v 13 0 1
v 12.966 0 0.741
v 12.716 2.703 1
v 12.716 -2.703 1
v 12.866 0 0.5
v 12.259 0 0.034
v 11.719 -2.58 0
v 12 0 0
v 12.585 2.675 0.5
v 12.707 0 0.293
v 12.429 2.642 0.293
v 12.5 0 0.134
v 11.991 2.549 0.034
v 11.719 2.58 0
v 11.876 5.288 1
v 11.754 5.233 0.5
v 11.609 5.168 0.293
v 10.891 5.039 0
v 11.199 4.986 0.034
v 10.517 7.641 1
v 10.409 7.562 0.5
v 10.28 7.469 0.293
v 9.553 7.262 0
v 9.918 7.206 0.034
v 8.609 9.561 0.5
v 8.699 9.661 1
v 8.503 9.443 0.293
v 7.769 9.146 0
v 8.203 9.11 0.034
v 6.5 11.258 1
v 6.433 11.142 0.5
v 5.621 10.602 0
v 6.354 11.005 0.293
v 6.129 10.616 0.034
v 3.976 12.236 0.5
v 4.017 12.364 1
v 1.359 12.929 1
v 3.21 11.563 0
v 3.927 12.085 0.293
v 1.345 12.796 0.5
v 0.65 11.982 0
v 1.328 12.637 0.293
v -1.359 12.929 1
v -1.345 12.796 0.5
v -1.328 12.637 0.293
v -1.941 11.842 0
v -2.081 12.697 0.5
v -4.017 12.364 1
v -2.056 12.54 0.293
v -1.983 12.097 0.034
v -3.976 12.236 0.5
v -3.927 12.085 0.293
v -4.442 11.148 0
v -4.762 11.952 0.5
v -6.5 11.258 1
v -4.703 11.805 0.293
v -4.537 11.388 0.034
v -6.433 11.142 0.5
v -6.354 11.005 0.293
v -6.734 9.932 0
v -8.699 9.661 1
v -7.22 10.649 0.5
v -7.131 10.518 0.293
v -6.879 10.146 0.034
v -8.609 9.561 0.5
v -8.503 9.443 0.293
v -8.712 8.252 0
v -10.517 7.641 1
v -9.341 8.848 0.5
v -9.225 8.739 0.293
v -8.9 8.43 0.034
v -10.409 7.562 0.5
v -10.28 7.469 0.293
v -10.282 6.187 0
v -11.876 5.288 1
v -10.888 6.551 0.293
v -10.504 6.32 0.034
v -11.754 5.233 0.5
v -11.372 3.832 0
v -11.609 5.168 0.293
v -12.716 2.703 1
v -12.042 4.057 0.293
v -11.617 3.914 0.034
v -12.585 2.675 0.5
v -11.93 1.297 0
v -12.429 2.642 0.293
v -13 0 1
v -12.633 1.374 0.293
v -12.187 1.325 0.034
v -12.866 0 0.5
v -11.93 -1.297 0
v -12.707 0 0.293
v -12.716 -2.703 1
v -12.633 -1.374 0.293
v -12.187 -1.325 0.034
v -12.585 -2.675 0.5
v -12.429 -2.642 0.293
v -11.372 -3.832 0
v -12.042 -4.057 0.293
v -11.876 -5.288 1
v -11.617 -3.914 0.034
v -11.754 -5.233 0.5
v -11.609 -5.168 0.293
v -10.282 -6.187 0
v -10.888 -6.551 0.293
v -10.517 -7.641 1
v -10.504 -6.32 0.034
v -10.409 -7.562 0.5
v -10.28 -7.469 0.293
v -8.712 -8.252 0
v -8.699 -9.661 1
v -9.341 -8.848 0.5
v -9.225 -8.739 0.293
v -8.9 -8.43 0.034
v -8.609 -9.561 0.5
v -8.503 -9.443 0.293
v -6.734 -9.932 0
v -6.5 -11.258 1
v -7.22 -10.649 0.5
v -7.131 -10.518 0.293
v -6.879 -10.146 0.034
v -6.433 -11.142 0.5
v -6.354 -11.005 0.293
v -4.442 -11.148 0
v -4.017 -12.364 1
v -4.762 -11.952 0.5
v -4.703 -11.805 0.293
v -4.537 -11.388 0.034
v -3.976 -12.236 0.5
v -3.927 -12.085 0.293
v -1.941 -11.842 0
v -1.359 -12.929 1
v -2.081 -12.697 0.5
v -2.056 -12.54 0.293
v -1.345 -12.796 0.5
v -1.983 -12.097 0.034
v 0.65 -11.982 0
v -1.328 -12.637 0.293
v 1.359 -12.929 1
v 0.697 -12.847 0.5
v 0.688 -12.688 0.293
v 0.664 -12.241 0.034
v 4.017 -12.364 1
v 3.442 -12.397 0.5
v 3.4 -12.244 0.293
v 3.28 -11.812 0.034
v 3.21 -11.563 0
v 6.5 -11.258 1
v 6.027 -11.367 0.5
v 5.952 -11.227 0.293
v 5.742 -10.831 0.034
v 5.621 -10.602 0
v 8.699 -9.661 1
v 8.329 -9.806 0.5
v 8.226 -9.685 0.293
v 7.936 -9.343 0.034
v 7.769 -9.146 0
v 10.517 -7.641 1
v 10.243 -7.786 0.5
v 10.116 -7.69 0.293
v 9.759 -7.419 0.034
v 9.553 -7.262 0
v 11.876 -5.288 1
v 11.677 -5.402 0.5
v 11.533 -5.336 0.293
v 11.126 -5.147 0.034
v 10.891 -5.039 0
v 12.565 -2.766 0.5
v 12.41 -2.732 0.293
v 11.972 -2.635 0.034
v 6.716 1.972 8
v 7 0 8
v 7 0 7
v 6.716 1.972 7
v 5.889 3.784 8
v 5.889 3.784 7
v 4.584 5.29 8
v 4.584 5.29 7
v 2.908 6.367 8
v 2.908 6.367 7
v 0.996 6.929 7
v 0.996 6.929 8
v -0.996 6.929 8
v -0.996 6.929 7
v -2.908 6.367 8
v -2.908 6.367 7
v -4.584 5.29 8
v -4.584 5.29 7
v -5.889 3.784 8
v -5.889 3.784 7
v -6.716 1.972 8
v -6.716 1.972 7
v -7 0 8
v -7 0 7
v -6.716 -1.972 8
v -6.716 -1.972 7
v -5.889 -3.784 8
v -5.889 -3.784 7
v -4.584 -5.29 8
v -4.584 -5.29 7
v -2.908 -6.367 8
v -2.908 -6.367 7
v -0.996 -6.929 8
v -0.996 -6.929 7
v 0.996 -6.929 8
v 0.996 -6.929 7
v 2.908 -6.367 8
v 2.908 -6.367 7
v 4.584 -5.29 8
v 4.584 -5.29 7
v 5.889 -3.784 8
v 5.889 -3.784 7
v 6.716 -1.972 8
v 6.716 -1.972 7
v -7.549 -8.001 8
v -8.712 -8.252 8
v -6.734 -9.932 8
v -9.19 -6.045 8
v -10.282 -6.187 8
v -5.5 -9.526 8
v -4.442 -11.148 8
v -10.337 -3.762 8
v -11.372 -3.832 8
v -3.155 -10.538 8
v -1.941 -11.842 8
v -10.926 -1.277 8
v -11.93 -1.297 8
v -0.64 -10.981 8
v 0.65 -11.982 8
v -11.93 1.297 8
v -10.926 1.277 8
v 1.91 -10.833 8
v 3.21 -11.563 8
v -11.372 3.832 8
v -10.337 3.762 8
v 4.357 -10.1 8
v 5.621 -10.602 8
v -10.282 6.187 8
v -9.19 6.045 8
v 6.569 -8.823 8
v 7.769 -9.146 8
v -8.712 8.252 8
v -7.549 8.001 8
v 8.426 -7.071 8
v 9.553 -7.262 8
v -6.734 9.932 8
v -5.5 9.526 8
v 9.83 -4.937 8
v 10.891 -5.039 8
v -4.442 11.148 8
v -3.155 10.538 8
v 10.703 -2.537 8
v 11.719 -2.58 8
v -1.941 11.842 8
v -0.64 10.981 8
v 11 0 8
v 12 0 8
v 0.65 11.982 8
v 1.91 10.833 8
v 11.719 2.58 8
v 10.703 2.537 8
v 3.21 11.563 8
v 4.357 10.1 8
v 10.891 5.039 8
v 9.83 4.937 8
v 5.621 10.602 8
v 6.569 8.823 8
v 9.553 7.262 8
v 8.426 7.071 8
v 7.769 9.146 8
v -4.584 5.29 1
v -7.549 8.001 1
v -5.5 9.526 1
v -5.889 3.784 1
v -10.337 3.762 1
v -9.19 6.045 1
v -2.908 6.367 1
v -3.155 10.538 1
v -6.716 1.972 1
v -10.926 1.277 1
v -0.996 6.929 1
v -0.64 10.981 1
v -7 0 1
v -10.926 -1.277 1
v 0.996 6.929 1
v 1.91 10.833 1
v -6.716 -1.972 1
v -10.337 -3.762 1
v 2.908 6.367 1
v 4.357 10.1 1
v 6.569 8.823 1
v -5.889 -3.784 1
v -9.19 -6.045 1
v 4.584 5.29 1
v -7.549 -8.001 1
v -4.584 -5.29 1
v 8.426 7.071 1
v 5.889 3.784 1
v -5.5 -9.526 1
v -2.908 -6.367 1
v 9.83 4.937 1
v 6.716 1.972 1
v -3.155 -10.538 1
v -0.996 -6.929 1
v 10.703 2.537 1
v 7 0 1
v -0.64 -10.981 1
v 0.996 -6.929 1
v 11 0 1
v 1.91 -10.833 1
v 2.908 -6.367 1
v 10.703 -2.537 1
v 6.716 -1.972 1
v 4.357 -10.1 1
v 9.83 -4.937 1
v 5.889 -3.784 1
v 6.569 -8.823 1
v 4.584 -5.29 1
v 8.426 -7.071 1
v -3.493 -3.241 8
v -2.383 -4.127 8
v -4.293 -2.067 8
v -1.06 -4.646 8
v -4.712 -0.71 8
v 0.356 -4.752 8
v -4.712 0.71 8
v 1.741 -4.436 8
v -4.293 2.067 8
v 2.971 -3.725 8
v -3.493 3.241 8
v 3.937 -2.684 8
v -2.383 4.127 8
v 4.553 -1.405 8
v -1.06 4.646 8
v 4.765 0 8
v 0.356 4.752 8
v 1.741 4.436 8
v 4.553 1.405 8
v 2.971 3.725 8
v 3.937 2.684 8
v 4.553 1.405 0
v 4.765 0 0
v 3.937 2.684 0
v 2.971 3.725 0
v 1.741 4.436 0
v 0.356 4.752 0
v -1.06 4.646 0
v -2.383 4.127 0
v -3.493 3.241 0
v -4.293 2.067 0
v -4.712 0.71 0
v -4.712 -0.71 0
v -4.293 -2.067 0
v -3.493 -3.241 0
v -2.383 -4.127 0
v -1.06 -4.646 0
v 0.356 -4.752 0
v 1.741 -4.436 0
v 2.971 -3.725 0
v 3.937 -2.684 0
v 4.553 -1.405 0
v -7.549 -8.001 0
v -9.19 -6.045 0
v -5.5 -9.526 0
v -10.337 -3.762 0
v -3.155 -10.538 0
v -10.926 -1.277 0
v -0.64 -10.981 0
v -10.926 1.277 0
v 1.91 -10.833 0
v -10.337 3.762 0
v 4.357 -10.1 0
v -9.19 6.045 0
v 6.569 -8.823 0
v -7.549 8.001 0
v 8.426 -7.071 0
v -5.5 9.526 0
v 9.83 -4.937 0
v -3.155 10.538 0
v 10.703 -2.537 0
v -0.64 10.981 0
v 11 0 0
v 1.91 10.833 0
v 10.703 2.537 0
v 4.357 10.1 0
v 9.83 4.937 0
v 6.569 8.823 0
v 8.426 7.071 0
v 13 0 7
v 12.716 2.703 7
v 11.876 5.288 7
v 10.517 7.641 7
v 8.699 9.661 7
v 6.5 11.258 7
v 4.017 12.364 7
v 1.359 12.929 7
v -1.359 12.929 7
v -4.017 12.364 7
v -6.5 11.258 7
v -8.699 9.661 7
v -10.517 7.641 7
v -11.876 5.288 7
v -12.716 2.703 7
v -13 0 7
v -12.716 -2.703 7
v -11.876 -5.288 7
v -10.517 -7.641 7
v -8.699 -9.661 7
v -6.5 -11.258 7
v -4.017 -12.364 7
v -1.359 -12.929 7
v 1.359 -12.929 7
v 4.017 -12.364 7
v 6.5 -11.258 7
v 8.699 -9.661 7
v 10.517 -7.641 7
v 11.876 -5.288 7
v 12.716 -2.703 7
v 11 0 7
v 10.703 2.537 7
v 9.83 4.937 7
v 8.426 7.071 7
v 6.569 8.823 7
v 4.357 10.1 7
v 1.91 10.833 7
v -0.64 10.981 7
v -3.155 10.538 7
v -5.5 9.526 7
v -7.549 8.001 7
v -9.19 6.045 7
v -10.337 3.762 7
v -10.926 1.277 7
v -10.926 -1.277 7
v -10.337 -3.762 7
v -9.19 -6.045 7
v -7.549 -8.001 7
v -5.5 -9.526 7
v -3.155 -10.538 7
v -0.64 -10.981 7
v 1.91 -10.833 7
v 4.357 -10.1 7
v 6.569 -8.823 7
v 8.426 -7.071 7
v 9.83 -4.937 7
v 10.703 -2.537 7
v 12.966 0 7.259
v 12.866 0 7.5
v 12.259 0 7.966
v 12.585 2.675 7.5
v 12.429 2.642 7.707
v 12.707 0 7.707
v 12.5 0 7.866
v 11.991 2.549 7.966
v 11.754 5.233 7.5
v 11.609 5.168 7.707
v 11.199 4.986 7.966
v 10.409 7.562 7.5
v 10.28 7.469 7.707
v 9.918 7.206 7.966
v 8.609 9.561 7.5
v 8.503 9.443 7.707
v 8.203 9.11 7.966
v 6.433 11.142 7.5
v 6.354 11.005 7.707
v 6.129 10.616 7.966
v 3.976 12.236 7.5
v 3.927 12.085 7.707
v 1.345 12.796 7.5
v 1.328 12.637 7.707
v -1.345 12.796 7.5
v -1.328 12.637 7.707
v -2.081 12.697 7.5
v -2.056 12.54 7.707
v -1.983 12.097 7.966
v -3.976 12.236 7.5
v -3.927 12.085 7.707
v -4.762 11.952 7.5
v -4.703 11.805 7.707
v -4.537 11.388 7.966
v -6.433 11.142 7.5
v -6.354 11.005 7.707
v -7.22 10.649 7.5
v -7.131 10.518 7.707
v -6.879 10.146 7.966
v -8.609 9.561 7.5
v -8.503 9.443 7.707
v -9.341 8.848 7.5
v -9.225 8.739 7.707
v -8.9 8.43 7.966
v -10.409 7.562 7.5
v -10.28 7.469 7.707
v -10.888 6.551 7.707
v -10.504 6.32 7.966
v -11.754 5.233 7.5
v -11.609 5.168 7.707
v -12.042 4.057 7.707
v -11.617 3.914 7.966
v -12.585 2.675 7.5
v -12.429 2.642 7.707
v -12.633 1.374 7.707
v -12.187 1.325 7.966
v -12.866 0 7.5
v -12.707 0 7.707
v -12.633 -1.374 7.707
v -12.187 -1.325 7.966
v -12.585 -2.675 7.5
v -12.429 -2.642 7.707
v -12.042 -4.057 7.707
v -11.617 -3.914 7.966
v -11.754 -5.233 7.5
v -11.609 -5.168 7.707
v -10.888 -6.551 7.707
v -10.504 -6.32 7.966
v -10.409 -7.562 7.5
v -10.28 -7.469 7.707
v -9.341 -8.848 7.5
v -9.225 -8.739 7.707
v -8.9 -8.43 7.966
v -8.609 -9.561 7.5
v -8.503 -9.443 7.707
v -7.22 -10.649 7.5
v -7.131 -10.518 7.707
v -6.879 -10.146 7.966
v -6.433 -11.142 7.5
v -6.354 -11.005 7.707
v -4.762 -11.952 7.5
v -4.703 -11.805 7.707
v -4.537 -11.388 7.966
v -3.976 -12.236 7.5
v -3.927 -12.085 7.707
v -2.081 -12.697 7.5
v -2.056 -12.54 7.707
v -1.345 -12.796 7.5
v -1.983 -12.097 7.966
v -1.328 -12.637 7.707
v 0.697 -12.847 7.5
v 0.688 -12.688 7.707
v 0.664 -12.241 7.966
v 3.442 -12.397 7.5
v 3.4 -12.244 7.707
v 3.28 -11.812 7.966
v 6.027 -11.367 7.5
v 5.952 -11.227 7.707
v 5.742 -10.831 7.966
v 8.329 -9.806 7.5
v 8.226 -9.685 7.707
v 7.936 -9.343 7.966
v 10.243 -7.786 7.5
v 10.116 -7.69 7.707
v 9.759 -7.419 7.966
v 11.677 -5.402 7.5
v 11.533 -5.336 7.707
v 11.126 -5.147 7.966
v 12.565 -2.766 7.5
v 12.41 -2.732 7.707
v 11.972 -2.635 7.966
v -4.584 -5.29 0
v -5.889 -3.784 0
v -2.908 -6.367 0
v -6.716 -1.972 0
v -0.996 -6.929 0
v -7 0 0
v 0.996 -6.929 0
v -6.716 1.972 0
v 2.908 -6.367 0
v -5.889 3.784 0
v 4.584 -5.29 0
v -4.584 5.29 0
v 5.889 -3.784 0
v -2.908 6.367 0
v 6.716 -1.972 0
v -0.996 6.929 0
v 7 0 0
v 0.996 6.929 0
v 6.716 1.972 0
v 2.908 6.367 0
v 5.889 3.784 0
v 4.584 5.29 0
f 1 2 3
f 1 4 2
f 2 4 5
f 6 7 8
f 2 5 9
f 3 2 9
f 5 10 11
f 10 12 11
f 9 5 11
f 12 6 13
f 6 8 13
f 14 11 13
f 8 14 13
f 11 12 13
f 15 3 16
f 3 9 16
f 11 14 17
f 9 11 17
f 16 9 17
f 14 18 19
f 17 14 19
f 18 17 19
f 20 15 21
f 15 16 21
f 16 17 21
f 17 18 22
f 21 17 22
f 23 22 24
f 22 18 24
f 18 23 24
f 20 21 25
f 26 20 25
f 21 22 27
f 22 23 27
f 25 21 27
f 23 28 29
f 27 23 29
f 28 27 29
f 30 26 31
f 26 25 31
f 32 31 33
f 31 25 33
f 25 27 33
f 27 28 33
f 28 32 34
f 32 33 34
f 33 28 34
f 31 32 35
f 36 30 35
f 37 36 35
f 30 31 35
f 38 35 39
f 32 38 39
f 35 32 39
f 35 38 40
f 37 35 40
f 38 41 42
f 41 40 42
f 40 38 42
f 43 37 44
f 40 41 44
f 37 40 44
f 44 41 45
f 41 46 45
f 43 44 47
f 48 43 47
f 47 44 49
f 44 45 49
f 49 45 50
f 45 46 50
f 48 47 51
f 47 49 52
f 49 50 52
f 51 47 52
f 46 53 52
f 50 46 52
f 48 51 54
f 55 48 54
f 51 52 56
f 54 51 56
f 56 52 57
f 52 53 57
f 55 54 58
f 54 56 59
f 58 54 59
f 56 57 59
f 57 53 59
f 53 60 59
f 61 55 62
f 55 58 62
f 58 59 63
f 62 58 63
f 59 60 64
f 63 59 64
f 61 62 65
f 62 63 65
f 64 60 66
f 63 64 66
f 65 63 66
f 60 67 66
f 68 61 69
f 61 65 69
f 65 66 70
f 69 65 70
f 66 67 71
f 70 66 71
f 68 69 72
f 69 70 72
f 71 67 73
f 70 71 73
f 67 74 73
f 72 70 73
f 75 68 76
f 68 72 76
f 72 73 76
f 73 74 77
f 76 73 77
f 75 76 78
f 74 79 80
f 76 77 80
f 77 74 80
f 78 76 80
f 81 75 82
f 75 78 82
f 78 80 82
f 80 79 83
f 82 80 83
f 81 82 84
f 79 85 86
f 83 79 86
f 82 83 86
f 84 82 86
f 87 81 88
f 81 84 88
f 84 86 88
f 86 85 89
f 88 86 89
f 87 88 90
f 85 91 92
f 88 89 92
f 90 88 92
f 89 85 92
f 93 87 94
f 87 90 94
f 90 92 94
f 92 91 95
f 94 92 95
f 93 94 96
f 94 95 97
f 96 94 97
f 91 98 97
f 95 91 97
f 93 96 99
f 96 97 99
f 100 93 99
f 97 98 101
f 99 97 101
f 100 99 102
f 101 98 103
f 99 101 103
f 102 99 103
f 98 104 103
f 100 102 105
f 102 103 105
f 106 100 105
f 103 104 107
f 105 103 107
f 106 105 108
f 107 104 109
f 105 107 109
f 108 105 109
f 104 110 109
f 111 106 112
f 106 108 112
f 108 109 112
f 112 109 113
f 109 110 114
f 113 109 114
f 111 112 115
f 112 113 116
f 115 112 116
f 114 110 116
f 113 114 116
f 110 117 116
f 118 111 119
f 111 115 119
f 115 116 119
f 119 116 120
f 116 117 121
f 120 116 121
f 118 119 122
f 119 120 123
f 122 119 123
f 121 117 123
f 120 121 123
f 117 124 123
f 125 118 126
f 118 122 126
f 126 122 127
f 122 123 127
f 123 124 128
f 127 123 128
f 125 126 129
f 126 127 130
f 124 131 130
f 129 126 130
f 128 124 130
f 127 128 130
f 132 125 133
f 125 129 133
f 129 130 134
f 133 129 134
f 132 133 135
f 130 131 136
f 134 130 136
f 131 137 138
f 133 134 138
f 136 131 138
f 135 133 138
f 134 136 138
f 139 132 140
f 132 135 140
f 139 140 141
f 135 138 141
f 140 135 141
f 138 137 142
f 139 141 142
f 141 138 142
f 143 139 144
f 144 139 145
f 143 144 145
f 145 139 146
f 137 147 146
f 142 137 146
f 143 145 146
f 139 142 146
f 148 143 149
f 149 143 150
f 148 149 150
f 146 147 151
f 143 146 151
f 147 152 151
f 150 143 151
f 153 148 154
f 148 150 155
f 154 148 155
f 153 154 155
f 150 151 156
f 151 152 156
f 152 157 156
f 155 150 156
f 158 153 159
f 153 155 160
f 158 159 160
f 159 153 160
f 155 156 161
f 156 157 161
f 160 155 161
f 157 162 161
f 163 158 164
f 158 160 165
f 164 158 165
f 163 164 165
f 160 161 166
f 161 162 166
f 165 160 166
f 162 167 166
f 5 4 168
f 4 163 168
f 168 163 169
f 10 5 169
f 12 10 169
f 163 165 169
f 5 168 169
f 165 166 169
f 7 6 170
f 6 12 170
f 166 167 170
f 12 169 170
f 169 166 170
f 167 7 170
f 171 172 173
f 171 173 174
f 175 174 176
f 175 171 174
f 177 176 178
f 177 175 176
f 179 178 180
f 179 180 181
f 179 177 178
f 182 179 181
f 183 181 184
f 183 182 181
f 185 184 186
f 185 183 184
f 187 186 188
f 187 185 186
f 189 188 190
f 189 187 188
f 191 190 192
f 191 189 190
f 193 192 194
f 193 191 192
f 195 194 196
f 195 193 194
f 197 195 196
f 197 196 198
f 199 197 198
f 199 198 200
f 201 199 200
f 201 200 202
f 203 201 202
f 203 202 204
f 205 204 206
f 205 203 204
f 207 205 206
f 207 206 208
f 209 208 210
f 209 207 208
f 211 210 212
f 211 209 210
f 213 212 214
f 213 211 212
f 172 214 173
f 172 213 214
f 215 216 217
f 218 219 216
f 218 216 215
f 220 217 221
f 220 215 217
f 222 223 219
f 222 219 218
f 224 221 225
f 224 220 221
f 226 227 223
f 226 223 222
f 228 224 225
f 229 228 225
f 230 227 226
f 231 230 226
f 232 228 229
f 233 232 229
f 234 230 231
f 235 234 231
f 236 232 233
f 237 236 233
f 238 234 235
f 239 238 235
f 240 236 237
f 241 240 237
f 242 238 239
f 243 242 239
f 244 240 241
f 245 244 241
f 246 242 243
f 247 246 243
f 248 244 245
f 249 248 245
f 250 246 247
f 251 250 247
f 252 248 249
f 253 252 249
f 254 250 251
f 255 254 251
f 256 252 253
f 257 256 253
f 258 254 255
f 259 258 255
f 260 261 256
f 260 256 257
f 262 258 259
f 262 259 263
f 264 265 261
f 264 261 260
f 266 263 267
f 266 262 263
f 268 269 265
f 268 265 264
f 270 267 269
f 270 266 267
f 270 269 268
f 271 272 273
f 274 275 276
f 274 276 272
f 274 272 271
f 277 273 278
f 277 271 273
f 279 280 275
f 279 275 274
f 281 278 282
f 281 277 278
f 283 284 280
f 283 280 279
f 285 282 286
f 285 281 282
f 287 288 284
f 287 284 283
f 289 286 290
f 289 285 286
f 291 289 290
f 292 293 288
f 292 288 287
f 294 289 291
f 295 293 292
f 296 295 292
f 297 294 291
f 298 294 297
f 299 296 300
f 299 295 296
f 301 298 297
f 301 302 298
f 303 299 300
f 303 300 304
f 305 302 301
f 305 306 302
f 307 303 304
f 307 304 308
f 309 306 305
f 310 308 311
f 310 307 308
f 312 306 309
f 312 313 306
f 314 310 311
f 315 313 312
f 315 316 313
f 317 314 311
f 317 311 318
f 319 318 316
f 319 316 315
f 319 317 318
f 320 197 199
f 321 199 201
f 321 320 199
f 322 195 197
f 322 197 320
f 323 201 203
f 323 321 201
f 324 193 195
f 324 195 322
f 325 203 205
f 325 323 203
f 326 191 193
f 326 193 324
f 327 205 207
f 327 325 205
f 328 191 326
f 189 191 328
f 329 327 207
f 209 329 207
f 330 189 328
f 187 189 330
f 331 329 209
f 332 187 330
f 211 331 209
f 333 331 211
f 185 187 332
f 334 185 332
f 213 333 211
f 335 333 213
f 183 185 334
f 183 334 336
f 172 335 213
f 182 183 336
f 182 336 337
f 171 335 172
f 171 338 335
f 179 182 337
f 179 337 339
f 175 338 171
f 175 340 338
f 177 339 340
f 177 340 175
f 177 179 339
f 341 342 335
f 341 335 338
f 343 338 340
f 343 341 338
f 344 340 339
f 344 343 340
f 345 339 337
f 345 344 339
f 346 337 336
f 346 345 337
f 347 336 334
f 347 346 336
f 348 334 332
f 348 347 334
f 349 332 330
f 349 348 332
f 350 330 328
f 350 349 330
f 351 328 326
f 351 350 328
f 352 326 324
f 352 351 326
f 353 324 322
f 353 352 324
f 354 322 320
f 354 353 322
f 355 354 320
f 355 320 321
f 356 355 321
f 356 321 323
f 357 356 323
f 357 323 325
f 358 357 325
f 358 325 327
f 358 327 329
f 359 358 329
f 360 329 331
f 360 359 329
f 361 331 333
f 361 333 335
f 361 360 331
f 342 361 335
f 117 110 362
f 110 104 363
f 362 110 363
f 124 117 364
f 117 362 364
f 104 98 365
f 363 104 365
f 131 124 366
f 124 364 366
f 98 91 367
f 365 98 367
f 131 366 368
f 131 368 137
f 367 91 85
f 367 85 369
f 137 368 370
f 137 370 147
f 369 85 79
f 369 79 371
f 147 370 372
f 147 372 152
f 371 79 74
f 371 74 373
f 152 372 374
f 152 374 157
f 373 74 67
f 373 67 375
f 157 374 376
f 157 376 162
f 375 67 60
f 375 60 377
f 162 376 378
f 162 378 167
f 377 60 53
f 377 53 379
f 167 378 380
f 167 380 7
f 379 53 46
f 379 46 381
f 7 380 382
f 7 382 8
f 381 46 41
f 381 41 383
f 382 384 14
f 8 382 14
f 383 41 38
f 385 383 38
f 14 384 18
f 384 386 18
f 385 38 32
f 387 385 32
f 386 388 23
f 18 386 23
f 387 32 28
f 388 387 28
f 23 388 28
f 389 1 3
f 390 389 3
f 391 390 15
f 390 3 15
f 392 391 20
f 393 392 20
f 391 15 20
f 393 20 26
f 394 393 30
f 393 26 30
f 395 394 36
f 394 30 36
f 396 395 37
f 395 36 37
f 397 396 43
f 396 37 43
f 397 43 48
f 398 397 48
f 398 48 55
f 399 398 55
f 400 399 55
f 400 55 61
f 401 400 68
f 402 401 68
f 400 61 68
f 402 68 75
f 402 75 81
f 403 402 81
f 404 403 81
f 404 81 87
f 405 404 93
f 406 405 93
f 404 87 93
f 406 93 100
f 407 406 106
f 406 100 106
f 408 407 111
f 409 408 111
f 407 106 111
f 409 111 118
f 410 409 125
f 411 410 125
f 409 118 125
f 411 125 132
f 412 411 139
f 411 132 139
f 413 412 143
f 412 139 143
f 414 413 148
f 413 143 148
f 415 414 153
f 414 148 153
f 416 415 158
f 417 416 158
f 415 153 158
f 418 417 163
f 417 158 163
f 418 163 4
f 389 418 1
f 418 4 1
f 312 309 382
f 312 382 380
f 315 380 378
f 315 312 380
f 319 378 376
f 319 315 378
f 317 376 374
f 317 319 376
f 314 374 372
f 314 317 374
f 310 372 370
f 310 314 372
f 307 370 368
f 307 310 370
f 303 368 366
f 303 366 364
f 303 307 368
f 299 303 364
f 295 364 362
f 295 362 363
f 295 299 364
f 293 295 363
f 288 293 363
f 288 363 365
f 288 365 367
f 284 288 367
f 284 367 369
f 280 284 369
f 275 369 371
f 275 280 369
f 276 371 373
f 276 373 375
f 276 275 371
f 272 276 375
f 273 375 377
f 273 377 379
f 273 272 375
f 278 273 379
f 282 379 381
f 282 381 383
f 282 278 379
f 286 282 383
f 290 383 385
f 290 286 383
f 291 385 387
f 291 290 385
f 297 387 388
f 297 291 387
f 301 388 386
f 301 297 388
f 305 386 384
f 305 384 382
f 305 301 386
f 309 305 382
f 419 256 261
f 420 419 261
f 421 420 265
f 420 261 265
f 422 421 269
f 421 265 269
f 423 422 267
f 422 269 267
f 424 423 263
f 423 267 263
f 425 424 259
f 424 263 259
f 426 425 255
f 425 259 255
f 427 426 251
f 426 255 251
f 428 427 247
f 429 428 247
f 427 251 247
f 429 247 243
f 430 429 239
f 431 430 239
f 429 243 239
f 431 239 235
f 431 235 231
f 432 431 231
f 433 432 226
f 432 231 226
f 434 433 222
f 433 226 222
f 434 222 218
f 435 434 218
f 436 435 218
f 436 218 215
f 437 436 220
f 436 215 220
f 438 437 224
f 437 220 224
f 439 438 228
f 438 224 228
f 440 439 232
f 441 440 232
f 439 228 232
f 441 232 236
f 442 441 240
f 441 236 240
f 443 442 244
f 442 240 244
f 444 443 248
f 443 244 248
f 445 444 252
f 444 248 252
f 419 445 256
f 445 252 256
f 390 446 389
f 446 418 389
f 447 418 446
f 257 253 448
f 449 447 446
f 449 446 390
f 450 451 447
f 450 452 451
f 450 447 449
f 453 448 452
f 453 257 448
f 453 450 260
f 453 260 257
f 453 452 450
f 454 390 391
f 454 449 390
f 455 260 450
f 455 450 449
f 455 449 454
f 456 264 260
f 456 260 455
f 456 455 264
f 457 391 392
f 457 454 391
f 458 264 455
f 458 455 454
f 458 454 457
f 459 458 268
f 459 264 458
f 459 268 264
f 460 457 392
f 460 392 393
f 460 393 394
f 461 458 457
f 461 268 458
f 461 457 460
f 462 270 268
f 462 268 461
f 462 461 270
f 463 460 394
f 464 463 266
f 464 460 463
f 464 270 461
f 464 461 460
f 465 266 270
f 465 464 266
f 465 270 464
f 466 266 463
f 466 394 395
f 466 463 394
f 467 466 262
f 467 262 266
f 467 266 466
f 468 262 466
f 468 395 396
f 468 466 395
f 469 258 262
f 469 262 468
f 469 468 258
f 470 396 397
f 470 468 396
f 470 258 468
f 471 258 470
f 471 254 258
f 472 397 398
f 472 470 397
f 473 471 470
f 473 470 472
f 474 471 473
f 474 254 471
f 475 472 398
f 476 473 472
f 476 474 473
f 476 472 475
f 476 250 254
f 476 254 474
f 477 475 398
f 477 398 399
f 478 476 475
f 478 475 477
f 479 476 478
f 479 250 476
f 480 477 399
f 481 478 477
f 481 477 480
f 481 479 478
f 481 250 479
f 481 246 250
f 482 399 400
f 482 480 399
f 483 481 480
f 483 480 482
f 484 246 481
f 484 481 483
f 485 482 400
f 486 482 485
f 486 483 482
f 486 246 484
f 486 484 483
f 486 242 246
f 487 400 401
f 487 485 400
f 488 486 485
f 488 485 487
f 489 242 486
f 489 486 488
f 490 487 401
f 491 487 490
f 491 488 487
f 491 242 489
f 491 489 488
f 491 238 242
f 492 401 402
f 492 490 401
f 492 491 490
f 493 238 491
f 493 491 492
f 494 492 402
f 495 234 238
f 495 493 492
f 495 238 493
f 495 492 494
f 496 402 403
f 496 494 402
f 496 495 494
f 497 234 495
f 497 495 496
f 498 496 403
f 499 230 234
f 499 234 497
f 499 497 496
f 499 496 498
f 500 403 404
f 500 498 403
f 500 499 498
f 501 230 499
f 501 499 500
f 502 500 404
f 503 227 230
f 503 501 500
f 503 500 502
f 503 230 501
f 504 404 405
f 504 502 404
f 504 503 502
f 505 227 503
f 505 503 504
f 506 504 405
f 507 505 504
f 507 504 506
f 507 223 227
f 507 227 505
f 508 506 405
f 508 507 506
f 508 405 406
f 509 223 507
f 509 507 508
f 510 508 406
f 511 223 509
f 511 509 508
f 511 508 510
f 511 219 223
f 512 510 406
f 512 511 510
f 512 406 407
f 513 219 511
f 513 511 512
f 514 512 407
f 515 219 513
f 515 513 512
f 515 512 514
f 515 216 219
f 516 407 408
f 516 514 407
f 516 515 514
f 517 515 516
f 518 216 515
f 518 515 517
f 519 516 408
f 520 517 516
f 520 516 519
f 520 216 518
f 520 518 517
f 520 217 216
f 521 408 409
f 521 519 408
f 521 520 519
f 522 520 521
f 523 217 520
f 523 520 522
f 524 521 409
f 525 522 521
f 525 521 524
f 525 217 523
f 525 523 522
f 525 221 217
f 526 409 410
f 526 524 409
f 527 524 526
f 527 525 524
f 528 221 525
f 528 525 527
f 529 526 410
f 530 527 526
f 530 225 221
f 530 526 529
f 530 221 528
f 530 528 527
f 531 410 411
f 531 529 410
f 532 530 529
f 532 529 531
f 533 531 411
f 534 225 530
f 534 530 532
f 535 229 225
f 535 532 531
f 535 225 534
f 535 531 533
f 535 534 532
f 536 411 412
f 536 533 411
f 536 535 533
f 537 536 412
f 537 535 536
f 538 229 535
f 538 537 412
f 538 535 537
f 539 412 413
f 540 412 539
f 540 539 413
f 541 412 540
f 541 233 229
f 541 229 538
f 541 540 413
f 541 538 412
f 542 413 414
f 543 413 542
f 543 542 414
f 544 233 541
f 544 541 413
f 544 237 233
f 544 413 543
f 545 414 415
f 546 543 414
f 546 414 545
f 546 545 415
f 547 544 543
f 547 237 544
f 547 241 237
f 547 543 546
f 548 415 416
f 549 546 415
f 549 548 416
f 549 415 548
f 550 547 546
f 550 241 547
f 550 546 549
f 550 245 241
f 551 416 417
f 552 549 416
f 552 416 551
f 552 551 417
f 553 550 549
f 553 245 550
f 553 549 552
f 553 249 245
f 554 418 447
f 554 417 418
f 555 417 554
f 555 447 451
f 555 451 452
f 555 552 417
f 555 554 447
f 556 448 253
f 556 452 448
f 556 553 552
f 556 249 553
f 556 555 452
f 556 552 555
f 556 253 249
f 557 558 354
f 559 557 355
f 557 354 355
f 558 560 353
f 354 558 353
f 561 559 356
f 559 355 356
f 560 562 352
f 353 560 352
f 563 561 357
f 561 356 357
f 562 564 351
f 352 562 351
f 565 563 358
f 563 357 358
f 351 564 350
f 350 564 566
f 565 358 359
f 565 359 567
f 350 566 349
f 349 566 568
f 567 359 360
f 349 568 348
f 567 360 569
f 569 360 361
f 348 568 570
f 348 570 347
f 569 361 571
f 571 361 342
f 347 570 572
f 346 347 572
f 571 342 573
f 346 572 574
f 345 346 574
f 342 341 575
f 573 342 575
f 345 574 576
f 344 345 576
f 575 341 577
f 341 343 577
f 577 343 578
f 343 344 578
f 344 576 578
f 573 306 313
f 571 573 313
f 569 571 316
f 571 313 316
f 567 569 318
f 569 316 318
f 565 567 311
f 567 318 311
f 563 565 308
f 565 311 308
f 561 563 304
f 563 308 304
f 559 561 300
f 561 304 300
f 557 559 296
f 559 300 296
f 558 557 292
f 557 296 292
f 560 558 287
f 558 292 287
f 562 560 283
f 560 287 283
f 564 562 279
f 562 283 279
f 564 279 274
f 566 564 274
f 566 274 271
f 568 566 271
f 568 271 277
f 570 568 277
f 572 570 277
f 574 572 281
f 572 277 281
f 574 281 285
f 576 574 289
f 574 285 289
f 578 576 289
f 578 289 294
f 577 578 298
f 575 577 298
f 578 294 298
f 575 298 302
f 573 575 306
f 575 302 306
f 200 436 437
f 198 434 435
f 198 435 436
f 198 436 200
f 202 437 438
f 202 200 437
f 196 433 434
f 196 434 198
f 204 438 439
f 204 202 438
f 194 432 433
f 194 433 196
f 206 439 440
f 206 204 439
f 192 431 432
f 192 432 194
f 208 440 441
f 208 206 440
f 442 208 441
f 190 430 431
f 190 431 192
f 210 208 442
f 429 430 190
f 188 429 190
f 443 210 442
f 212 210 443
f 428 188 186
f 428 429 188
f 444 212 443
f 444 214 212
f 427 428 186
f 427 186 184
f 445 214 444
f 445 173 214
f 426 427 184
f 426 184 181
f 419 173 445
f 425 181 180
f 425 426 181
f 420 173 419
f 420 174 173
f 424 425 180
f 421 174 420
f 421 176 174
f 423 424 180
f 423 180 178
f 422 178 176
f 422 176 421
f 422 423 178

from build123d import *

# Parameters (mm, degrees)
ESBO_O1_R                = 13
ESBO_O1_R_2              = 4.765
RESSALTO_EXTRUS_O1_DEPTH = 8
ESBO_O2_R                = 11
ESBO_O2_R_2              = 7
CORTE_EXTRUS_O1_DEPTH    = 1
CORTE_EXTRUS_O2_START    = -1
ESBO_O3_R                = 11
ESBO_O3_R_2              = 7
CORTE_EXTRUS_O2_DEPTH    = 1
FILETE1_R                = 1


with BuildPart() as part:
    # Esboço1 → Ressalto-extrusão1 (new body)
    with BuildSketch(Plane.XY):
        Circle(ESBO_O1_R)
        Circle(ESBO_O1_R_2, mode=Mode.SUBTRACT)
    extrude(amount=RESSALTO_EXTRUS_O1_DEPTH)

    # Esboço2 → Corte-extrusão1 (cut)
    with BuildSketch(Plane.XY.offset(8)):
        Circle(ESBO_O2_R)
        Circle(ESBO_O2_R_2, mode=Mode.SUBTRACT)
    extrude(amount=-CORTE_EXTRUS_O1_DEPTH, mode=Mode.SUBTRACT)

    # Esboço3 → Corte-extrusão2 (cut)
    with BuildSketch(Plane(origin=(0, 0, 0), x_dir=(-1, 0, 0), z_dir=(0, 0, -1)).offset(CORTE_EXTRUS_O2_START)):
        with Locations(Location((0, 0, 0), (0, 0, 180))):
            Circle(ESBO_O3_R)
        with Locations(Location((0, 0, 0), (0, 0, 180))):
            Circle(ESBO_O3_R_2, mode=Mode.SUBTRACT)
    extrude(amount=CORTE_EXTRUS_O2_DEPTH, mode=Mode.SUBTRACT)

    # Filete1
    filete1_edges = [part.edges().sort_by_distance(p)[0] for p in [
        (-13, 0, 0),
        (-13, 0, 8),
    ]]
    fillet(filete1_edges, radius=FILETE1_R)


solid = part.part
